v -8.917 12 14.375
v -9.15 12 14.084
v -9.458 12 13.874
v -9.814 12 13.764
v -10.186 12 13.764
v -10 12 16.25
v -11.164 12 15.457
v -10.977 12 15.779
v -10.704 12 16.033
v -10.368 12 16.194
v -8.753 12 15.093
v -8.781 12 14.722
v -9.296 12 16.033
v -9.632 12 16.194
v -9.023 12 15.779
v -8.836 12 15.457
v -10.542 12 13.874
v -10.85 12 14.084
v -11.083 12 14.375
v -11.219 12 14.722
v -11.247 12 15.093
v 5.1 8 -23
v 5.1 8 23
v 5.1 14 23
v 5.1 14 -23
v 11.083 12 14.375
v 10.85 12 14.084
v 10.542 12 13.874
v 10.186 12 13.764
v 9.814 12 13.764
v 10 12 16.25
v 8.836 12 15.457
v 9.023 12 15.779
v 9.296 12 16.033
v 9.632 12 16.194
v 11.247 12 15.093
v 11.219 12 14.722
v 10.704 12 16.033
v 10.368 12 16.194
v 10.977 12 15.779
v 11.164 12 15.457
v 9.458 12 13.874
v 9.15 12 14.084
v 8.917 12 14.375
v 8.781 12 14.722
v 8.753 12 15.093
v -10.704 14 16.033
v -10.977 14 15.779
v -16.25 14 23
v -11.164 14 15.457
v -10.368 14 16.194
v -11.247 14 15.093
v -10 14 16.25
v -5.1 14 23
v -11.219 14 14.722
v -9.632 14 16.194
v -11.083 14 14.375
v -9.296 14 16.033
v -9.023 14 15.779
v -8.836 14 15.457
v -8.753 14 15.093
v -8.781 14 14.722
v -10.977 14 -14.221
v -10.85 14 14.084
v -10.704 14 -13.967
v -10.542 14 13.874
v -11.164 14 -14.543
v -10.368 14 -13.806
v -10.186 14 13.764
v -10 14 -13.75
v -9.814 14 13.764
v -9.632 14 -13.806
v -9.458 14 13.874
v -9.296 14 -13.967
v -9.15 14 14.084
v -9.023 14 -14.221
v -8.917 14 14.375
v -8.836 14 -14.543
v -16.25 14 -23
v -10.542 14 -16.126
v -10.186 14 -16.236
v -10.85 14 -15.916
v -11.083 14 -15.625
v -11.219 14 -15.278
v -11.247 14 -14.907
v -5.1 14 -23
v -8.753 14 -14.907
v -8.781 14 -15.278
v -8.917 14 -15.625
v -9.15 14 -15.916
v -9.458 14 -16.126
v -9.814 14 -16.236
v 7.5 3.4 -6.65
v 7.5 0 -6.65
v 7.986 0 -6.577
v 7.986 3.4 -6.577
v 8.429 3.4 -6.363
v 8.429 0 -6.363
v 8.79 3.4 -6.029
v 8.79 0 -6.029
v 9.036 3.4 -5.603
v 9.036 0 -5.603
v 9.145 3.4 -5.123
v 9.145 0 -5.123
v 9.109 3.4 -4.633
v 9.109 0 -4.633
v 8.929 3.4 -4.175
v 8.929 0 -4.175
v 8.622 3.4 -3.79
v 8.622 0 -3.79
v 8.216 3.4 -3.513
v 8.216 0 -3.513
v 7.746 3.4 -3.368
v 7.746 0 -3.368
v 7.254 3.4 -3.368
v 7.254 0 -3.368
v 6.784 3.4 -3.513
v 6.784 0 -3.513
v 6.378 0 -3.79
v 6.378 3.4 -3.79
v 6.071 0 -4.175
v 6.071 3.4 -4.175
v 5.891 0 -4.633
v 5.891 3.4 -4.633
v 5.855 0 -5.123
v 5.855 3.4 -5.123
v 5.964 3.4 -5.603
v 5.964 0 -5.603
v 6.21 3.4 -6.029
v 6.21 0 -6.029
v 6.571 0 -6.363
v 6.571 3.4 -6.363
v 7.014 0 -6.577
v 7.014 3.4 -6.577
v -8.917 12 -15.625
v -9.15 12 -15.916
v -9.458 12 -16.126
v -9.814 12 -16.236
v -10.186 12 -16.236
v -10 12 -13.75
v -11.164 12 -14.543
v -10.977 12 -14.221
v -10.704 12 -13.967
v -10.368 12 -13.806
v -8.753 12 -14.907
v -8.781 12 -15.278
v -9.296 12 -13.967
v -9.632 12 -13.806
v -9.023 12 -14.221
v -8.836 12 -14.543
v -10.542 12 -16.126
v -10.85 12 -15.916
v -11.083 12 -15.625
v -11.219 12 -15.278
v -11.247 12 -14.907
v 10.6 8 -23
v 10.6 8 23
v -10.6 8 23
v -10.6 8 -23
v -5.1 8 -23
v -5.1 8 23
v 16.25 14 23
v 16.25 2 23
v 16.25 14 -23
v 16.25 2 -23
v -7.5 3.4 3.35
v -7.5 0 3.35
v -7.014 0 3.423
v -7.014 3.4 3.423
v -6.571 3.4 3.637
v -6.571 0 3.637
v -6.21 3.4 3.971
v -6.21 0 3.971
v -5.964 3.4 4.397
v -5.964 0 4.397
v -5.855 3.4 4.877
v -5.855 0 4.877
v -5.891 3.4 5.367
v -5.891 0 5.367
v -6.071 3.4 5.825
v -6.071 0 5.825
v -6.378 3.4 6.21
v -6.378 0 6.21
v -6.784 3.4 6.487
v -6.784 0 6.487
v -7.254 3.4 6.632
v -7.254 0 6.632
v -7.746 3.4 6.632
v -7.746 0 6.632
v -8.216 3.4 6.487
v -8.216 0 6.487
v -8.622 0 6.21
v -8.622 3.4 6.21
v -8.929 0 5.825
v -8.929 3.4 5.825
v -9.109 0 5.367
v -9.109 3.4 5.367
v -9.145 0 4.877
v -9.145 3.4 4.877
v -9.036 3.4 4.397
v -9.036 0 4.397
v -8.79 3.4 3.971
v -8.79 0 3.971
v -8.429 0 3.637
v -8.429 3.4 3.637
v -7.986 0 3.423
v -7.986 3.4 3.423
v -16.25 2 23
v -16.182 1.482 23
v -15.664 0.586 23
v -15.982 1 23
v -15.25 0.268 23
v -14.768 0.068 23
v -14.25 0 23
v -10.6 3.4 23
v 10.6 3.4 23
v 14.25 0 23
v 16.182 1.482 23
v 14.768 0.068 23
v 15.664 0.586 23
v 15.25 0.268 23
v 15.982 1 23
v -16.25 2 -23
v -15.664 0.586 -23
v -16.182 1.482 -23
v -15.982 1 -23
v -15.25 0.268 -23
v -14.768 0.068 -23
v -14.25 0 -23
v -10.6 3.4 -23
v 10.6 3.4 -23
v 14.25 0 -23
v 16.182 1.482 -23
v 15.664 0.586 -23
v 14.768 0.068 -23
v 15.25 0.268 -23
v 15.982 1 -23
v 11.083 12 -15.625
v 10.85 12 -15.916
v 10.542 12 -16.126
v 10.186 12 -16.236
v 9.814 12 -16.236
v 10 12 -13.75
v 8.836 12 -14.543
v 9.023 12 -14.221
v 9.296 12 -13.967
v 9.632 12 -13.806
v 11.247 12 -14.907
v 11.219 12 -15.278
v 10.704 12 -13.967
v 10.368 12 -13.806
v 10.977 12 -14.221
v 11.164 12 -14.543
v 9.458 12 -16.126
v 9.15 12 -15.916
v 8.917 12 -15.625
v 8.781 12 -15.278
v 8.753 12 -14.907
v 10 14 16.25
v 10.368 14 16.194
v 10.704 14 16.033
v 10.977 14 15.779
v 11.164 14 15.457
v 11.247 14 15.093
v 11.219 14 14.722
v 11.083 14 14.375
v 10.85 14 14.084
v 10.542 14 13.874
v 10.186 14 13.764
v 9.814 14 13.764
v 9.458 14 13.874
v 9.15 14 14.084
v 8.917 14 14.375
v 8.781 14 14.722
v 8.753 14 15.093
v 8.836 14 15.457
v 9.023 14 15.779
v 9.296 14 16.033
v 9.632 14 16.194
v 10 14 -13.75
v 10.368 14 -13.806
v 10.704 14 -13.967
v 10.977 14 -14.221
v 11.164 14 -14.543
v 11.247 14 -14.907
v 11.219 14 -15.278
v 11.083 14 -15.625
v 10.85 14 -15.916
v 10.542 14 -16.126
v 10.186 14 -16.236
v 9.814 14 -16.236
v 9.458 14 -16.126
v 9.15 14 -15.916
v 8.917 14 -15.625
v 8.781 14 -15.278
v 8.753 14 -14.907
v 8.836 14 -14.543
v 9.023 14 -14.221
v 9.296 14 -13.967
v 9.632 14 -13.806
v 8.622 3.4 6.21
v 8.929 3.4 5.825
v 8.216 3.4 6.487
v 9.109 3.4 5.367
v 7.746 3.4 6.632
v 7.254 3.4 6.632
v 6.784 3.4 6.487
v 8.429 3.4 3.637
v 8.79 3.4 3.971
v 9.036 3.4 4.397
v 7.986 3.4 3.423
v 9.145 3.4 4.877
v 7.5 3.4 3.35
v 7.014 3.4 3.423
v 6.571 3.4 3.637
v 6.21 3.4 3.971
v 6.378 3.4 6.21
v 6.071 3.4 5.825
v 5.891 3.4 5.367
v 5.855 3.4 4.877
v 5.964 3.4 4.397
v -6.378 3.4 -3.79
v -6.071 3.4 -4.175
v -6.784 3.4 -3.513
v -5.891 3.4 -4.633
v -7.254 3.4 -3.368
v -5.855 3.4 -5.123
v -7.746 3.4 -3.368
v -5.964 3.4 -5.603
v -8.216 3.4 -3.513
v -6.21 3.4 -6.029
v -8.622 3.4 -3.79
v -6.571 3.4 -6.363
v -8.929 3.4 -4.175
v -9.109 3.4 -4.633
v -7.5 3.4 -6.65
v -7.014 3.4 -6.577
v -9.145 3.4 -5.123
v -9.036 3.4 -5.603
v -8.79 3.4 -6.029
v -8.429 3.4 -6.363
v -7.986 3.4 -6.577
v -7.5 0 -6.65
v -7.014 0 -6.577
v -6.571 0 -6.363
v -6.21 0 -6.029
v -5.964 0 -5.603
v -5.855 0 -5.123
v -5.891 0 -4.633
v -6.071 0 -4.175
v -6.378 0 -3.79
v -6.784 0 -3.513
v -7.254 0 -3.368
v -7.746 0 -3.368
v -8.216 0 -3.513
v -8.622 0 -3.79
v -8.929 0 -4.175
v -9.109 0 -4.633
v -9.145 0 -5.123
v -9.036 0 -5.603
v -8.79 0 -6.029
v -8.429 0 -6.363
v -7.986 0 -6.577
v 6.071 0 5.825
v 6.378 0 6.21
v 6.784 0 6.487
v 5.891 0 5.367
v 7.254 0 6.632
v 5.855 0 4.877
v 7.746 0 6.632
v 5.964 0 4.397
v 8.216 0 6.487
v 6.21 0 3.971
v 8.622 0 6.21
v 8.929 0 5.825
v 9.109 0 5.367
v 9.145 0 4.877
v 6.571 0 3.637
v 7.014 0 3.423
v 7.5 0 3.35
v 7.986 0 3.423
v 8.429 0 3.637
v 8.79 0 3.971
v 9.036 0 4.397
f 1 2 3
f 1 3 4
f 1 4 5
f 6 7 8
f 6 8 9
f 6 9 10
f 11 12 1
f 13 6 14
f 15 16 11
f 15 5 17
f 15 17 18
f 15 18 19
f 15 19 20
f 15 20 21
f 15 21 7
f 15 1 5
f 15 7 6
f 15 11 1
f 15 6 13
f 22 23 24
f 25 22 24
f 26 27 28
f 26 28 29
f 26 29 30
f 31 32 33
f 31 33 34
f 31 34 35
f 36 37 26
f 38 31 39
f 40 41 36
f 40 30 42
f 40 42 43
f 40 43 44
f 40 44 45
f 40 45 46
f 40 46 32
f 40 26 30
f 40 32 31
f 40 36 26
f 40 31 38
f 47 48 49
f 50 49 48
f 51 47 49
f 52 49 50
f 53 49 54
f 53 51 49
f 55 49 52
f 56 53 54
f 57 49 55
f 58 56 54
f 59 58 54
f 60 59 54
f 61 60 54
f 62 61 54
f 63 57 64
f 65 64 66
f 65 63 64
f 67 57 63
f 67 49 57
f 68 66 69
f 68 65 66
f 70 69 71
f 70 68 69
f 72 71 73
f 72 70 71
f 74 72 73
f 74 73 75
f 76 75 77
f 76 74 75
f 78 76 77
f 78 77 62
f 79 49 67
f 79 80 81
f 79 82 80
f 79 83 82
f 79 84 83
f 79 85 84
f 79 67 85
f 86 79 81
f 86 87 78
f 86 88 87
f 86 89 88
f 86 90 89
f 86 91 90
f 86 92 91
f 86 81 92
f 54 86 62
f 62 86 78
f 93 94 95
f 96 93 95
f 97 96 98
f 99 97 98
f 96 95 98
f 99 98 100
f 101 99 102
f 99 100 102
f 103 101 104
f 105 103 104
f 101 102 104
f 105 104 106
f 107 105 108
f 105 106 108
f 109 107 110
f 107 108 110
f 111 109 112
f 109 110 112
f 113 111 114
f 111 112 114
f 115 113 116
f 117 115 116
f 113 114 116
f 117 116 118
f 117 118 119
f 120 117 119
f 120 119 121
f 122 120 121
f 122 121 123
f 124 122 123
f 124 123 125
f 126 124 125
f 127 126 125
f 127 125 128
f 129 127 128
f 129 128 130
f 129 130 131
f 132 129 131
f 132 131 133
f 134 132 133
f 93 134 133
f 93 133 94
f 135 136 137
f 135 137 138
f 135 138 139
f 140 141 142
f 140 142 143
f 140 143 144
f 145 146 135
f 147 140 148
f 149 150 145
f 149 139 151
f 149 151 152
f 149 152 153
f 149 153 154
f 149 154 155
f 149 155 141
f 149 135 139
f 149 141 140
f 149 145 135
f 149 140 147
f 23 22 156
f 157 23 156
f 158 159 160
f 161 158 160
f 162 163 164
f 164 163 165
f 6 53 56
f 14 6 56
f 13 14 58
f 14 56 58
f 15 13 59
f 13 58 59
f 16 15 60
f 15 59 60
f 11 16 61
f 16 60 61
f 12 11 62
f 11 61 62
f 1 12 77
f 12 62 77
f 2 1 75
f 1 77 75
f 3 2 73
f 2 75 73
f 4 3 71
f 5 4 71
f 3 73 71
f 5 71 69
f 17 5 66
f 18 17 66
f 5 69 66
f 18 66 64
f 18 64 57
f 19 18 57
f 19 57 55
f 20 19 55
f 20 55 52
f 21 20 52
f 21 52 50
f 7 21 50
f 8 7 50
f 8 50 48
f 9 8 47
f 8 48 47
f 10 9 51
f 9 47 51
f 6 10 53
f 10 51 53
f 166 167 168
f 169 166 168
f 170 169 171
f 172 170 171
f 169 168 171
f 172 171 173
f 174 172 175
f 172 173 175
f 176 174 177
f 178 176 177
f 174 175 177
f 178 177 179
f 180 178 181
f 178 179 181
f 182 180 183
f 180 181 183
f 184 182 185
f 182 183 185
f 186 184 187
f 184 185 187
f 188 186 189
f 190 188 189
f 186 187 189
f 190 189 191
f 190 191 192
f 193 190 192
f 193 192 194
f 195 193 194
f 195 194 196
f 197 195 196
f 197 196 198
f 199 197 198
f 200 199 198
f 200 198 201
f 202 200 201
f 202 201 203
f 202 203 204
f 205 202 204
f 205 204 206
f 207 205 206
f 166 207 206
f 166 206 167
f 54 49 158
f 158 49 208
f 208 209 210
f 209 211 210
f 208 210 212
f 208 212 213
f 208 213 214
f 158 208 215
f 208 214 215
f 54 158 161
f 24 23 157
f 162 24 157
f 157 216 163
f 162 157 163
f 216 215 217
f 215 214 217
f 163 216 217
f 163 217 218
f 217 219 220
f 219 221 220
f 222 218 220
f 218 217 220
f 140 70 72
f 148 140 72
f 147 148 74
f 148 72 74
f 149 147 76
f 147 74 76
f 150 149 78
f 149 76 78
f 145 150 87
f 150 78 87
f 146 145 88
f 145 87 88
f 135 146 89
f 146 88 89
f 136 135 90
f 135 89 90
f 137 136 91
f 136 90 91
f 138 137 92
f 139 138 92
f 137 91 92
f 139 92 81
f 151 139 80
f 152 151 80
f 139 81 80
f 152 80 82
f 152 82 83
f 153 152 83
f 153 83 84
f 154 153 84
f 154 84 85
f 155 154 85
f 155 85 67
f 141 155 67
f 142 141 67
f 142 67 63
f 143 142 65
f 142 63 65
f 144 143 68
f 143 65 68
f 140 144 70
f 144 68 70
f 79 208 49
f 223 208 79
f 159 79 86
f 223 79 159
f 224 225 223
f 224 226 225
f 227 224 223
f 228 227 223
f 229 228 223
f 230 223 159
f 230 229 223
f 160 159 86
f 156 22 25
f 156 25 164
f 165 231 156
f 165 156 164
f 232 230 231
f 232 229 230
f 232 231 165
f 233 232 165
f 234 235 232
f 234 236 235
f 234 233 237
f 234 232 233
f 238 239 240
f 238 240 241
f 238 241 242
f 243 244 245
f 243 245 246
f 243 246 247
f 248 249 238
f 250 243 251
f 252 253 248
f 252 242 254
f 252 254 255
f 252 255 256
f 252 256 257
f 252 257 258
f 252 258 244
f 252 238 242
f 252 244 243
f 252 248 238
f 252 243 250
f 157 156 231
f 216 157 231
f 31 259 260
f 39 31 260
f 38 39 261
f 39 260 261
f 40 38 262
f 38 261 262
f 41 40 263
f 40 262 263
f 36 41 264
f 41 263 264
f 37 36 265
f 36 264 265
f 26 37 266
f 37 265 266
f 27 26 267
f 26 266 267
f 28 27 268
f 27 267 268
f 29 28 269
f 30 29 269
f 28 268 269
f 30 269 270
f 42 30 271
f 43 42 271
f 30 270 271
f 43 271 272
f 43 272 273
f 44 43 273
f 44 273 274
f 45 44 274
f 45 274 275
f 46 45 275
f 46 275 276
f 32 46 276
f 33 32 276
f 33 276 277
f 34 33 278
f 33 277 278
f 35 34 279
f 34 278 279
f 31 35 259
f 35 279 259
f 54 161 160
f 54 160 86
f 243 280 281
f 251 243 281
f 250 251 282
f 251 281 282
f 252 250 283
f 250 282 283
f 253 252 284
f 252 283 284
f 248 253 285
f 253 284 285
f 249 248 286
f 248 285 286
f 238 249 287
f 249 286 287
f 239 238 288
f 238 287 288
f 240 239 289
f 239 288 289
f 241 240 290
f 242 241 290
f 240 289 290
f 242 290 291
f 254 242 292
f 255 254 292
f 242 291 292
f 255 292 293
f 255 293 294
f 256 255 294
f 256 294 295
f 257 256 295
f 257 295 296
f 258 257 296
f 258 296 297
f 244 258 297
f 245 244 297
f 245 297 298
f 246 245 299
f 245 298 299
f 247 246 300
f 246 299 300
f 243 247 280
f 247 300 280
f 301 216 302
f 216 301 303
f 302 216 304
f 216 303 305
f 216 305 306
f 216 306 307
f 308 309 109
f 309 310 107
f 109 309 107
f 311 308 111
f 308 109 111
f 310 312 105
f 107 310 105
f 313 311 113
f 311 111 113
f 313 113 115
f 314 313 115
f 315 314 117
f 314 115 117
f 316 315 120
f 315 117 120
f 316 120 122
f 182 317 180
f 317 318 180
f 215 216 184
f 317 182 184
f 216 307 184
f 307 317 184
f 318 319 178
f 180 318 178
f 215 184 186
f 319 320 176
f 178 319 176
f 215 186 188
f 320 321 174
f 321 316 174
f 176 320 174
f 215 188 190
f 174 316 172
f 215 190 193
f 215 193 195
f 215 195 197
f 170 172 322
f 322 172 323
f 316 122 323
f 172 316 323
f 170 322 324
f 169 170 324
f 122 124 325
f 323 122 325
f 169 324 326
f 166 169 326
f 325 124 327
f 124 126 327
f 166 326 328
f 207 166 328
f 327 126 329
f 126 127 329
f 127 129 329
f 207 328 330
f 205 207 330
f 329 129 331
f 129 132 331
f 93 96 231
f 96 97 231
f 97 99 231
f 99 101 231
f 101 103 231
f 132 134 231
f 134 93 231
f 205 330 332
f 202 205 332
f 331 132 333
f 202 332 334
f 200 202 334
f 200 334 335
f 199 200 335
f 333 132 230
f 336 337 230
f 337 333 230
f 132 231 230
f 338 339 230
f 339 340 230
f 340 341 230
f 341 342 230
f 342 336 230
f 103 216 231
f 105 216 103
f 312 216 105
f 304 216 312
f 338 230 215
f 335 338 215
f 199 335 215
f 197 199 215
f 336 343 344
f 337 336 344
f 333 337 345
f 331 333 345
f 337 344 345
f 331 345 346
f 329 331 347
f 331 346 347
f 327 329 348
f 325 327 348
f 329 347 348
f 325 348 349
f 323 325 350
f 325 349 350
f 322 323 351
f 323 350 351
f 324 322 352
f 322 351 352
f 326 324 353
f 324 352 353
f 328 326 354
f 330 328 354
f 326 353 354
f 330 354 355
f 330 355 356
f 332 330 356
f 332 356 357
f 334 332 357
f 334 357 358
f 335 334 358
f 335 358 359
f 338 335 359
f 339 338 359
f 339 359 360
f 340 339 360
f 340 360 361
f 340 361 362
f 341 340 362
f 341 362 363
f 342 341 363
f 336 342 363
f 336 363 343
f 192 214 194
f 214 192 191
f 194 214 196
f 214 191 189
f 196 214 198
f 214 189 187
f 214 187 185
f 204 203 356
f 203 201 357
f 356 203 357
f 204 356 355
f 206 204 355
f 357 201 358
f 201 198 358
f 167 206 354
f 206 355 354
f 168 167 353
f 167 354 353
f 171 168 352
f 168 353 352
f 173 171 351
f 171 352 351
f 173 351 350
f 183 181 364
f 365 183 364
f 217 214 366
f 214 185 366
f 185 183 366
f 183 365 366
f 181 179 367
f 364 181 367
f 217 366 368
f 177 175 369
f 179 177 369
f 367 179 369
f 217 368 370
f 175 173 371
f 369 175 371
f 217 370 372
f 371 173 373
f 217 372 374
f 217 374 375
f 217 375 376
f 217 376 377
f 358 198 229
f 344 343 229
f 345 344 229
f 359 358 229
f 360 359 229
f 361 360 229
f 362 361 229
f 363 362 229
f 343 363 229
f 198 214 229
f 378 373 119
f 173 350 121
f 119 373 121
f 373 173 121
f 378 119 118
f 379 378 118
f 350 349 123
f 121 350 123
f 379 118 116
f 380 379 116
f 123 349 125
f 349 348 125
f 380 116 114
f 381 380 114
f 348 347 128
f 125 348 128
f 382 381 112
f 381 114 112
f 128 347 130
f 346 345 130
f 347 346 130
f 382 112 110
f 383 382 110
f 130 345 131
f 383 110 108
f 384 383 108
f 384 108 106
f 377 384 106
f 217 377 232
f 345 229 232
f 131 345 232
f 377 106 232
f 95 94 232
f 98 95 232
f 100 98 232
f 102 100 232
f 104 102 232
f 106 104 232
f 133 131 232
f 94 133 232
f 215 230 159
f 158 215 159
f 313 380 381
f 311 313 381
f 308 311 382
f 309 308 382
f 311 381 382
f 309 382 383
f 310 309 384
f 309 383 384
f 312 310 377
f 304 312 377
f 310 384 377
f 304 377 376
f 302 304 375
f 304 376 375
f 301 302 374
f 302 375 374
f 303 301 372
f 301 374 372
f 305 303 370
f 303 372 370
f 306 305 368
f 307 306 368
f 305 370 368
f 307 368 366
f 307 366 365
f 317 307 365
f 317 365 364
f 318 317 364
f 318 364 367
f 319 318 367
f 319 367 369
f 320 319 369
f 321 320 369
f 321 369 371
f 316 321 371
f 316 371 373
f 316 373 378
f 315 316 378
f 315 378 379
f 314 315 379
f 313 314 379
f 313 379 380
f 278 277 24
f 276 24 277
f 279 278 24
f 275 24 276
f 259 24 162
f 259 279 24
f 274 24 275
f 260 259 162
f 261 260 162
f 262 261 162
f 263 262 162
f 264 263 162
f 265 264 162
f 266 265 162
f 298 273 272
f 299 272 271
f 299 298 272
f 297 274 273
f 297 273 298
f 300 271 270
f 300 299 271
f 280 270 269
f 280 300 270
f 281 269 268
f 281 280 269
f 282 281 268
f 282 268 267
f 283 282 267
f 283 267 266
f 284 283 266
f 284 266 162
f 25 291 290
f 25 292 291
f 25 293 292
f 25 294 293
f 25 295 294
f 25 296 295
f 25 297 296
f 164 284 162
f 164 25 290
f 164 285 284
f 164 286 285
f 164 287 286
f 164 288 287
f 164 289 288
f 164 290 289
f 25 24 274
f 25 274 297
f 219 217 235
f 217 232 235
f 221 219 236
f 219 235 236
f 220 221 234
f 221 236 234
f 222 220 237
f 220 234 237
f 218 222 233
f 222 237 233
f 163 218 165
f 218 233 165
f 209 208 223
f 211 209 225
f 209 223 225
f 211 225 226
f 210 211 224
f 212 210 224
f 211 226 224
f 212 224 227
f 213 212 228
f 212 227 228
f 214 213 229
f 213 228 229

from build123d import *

# Parameters (mm, degrees)
SKETCH_1_W          = 32.5
SKETCH_1_H          = 46
EXTRUDE_1_DEPTH     = 14
SKETCH_2_W          = 10.2
SKETCH_2_H          = 6
CUT_EXTRUDE_2_DEPTH = 51.754925869
CUT_EXTRUDE_3_REACH = 33.449
SKETCH_4_R          = 1.65
SKETCH_5_R          = 1.25
CUT_EXTRUDE_4_DEPTH = 2
FILLET_1_R          = 2


with BuildPart() as part:
    # 草图1 → 凸台-拉伸1 (new body)
    with BuildSketch(Plane(origin=(0, 0, 0), x_dir=(1, 0, 0), z_dir=(0, 1, 0))):
        Rectangle(SKETCH_1_W, SKETCH_1_H)
    extrude(amount=EXTRUDE_1_DEPTH)

    # 草图2 → 切除-拉伸2 (cut, through all)
    with BuildSketch(Plane(origin=(0, 0, -23), x_dir=(-1, 0, 0), z_dir=(0, 0, -1))):
        with Locations((0, 11)):
            Rectangle(SKETCH_2_W, SKETCH_2_H)
        Polygon((5.1, 8), (-5.1, 8), (-10.6, 8), (-10.6, 3.4), (10.6, 3.4), (10.6, 8), align=None)
    extrude(amount=-CUT_EXTRUDE_2_DEPTH, mode=Mode.SUBTRACT)

    # 草图4 → 切除-拉伸3 (cut, up to next)
    with BuildSketch(Plane.XZ, mode=Mode.PRIVATE) as cut_extrude_3_sk1:
        with Locations(Location((-7.5, 5, 0), (0, 0, 270))):
            Circle(SKETCH_4_R)
    cut_extrude_3_tool1 = extrude(cut_extrude_3_sk1.sketch, amount=-CUT_EXTRUDE_3_REACH, mode=Mode.PRIVATE) & part.part
    # 草图4 → 切除-拉伸3 (cut, up to next)
    with BuildSketch(Plane.XZ, mode=Mode.PRIVATE) as cut_extrude_3_sk2:
        with Locations(Location((7.5, 5, 0), (0, 0, 270))):
            Circle(SKETCH_4_R)
    cut_extrude_3_tool2 = extrude(cut_extrude_3_sk2.sketch, amount=-CUT_EXTRUDE_3_REACH, mode=Mode.PRIVATE) & part.part
    # 草图4 → 切除-拉伸3 (cut, up to next)
    with BuildSketch(Plane.XZ, mode=Mode.PRIVATE) as cut_extrude_3_sk3:
        with Locations(Location((7.5, -5, 0), (0, 0, 270))):
            Circle(SKETCH_4_R)
    cut_extrude_3_tool3 = extrude(cut_extrude_3_sk3.sketch, amount=-CUT_EXTRUDE_3_REACH, mode=Mode.PRIVATE) & part.part
    # 草图4 → 切除-拉伸3 (cut, up to next)
    with BuildSketch(Plane.XZ, mode=Mode.PRIVATE) as cut_extrude_3_sk4:
        with Locations(Location((-7.5, -5, 0), (0, 0, 270))):
            Circle(SKETCH_4_R)
    cut_extrude_3_tool4 = extrude(cut_extrude_3_sk4.sketch, amount=-CUT_EXTRUDE_3_REACH, mode=Mode.PRIVATE) & part.part
    add(cut_extrude_3_tool1.solids().sort_by_distance((-7.5, 0, 5))[0], mode=Mode.SUBTRACT)
    add(cut_extrude_3_tool2.solids().sort_by_distance((7.5, 0, 5))[0], mode=Mode.SUBTRACT)
    add(cut_extrude_3_tool3.solids().sort_by_distance((7.5, 0, -5))[0], mode=Mode.SUBTRACT)
    add(cut_extrude_3_tool4.solids().sort_by_distance((-7.5, 0, -5))[0], mode=Mode.SUBTRACT)

    # 草图5 → 切除-拉伸4 (cut)
    with BuildSketch(Plane(origin=(0, 14, 0), x_dir=(1, 0, 0), z_dir=(0, 1, 0))):
        with Locations(Location((-10, 15, 0), (0, 0, 270))):
            Circle(SKETCH_5_R)
        with Locations(Location((10, 15, 0), (0, 0, 270))):
            Circle(SKETCH_5_R)
        with Locations(Location((10, -15, 0), (0, 0, 270))):
            Circle(SKETCH_5_R)
        with Locations(Location((-10, -15, 0), (0, 0, 270))):
            Circle(SKETCH_5_R)
    extrude(amount=-CUT_EXTRUDE_4_DEPTH, mode=Mode.SUBTRACT)

    # 圆角1
    fillet_1_edges = [part.edges().sort_by_distance(p)[0] for p in [
        (16.25, 0, 0),
        (-16.25, 0, 0),
    ]]
    fillet(fillet_1_edges, radius=FILLET_1_R)


solid = part.part
